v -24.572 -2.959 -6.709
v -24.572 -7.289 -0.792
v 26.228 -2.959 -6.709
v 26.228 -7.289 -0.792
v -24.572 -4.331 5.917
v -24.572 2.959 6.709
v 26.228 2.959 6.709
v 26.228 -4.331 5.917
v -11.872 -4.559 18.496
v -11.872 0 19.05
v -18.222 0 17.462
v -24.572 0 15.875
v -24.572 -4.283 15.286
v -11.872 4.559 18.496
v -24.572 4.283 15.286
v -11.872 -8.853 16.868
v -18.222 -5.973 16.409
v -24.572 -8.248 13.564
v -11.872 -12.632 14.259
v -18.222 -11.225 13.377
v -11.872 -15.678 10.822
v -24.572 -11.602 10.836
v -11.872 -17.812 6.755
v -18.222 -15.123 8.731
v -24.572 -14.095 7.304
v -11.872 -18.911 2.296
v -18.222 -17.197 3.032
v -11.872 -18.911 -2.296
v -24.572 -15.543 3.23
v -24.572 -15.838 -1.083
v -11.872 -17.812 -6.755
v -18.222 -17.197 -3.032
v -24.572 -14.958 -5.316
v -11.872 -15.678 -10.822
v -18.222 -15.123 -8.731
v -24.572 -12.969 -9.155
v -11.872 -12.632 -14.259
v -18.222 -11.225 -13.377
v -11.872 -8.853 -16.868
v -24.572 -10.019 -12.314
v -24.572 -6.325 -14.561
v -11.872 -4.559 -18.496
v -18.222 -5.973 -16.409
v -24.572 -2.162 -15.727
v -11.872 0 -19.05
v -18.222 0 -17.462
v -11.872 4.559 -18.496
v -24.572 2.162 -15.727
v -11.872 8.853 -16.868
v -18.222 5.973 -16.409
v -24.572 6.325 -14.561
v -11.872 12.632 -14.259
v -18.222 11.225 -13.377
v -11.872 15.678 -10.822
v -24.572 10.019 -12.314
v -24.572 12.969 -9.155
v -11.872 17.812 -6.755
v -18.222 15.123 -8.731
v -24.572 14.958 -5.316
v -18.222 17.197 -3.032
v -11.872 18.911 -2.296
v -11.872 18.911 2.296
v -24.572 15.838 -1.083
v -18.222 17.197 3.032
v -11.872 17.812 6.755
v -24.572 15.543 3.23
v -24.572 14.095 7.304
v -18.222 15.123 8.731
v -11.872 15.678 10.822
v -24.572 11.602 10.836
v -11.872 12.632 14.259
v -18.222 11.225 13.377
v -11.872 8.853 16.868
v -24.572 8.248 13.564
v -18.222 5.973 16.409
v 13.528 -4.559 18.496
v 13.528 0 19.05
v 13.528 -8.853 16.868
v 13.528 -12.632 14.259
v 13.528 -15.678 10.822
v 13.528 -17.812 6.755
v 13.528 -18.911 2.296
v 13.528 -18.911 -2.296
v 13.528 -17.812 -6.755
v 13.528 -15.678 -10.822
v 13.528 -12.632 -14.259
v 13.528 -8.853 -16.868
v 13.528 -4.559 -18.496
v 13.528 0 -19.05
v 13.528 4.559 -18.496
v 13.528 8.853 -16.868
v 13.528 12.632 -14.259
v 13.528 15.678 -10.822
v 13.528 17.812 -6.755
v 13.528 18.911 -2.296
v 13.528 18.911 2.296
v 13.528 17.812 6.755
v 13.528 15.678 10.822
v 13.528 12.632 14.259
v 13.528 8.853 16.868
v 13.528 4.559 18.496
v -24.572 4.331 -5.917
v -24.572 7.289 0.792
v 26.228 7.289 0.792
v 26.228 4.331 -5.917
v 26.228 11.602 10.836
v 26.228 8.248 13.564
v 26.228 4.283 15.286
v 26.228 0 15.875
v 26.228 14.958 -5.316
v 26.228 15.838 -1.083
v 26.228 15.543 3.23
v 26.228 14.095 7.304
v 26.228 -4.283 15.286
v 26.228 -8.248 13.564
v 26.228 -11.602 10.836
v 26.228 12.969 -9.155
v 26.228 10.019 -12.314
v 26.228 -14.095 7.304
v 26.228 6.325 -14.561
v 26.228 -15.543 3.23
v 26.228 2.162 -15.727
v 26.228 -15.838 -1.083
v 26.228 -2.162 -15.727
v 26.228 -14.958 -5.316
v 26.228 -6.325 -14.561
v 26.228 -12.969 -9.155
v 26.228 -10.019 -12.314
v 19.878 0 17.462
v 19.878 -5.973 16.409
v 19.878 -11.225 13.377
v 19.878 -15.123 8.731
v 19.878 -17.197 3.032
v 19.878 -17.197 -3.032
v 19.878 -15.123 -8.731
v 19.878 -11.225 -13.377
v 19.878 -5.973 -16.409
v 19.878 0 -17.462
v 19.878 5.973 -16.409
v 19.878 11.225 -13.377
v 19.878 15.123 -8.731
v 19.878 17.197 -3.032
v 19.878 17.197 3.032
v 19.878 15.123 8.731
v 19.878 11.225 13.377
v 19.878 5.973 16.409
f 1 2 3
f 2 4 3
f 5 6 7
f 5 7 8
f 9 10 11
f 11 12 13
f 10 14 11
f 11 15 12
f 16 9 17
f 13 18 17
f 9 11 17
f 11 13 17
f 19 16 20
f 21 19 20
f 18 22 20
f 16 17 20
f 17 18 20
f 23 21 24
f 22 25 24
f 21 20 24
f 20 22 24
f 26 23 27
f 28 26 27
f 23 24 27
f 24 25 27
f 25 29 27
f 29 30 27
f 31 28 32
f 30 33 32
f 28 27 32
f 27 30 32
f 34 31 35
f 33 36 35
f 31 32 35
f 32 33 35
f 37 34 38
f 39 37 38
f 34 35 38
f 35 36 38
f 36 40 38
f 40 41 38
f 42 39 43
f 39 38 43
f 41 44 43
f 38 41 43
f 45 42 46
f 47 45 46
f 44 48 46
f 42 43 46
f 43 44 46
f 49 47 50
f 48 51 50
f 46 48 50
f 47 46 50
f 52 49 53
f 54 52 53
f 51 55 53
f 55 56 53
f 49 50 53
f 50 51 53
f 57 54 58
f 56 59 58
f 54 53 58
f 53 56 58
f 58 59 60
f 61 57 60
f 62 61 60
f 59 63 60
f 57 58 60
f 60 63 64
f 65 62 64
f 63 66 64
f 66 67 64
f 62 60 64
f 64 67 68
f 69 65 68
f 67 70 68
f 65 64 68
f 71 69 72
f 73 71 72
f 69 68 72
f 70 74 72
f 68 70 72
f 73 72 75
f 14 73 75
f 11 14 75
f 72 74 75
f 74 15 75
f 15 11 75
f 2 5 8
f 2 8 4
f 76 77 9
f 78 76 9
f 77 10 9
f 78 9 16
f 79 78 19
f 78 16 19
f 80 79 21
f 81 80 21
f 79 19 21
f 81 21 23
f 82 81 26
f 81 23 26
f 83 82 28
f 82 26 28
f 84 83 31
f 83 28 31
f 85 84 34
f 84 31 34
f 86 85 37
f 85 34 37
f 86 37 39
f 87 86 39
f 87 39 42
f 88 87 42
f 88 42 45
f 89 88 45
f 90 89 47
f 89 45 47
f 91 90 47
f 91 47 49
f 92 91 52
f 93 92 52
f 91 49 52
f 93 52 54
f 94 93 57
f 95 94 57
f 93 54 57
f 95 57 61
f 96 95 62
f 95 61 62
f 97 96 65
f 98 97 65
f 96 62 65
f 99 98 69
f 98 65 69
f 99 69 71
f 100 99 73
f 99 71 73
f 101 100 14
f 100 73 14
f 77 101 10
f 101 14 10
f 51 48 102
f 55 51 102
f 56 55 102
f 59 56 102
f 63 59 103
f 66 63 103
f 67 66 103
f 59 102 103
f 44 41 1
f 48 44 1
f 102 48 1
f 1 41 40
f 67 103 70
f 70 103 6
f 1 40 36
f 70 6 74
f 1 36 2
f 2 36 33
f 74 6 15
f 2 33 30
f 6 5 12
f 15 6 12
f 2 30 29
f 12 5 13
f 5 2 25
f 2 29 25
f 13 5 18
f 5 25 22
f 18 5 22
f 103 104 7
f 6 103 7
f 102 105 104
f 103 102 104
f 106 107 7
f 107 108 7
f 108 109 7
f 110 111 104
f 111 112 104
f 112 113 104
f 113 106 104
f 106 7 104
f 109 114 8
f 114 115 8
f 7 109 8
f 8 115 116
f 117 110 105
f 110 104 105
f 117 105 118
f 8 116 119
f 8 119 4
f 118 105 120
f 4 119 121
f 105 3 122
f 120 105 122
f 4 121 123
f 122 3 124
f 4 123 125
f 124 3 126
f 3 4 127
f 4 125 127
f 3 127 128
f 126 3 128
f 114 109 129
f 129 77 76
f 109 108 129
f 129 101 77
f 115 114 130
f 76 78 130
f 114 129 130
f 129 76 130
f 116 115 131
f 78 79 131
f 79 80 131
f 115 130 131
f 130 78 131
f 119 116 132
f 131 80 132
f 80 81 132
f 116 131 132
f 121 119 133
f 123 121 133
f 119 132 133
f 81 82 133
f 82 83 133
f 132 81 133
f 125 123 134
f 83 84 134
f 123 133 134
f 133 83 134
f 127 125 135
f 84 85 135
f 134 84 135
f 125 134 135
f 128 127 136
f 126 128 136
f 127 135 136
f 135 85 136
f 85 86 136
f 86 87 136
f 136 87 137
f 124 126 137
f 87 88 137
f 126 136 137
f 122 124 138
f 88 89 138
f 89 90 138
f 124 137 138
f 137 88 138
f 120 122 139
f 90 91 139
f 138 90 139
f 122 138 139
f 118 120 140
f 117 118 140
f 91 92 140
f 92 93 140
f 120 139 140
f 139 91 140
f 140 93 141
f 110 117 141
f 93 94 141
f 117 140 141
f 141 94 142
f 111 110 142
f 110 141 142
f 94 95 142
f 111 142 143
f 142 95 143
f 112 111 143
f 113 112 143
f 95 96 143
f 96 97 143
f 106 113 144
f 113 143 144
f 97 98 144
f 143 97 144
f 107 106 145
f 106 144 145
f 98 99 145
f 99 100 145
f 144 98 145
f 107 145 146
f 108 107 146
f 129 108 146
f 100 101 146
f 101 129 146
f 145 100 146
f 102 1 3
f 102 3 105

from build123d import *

# Parameters (mm, degrees)
F3_DEPTH      = 50.8
F3_DEPTH_BACK = 50.8


with BuildPart() as f1:
    # F0 (on Front) → F1 (revolve)
    with BuildSketch(Plane.XZ):
        Polygon((-24.5717495672, 15.875), (-24.5717495672, 6.35), (26.2282504328, 6.35), (26.2282504328, 15.875), (13.5282504328, 19.05), (-11.8717495672, 19.05), align=None)
    revolve(axis=Axis((0.4141309397, 0, 0), (1, 0, 0)))

    # F2 (on Right) → F3 (cut, two sides)
    with BuildSketch(Plane.YZ) as f3_sk:
        Polygon((7.2894281006, 0.7921939781), (2.9586539406, 6.7089269033), (-4.3307741601, 5.9167329252), (-7.2894281006, -0.7921939781), (-2.9586539406, -6.7089269033), (4.3307741601, -5.9167329252), align=None)
    extrude(amount=-F3_DEPTH, mode=Mode.SUBTRACT)
    extrude(f3_sk.sketch, amount=F3_DEPTH_BACK, mode=Mode.SUBTRACT)


solid = f1.part
